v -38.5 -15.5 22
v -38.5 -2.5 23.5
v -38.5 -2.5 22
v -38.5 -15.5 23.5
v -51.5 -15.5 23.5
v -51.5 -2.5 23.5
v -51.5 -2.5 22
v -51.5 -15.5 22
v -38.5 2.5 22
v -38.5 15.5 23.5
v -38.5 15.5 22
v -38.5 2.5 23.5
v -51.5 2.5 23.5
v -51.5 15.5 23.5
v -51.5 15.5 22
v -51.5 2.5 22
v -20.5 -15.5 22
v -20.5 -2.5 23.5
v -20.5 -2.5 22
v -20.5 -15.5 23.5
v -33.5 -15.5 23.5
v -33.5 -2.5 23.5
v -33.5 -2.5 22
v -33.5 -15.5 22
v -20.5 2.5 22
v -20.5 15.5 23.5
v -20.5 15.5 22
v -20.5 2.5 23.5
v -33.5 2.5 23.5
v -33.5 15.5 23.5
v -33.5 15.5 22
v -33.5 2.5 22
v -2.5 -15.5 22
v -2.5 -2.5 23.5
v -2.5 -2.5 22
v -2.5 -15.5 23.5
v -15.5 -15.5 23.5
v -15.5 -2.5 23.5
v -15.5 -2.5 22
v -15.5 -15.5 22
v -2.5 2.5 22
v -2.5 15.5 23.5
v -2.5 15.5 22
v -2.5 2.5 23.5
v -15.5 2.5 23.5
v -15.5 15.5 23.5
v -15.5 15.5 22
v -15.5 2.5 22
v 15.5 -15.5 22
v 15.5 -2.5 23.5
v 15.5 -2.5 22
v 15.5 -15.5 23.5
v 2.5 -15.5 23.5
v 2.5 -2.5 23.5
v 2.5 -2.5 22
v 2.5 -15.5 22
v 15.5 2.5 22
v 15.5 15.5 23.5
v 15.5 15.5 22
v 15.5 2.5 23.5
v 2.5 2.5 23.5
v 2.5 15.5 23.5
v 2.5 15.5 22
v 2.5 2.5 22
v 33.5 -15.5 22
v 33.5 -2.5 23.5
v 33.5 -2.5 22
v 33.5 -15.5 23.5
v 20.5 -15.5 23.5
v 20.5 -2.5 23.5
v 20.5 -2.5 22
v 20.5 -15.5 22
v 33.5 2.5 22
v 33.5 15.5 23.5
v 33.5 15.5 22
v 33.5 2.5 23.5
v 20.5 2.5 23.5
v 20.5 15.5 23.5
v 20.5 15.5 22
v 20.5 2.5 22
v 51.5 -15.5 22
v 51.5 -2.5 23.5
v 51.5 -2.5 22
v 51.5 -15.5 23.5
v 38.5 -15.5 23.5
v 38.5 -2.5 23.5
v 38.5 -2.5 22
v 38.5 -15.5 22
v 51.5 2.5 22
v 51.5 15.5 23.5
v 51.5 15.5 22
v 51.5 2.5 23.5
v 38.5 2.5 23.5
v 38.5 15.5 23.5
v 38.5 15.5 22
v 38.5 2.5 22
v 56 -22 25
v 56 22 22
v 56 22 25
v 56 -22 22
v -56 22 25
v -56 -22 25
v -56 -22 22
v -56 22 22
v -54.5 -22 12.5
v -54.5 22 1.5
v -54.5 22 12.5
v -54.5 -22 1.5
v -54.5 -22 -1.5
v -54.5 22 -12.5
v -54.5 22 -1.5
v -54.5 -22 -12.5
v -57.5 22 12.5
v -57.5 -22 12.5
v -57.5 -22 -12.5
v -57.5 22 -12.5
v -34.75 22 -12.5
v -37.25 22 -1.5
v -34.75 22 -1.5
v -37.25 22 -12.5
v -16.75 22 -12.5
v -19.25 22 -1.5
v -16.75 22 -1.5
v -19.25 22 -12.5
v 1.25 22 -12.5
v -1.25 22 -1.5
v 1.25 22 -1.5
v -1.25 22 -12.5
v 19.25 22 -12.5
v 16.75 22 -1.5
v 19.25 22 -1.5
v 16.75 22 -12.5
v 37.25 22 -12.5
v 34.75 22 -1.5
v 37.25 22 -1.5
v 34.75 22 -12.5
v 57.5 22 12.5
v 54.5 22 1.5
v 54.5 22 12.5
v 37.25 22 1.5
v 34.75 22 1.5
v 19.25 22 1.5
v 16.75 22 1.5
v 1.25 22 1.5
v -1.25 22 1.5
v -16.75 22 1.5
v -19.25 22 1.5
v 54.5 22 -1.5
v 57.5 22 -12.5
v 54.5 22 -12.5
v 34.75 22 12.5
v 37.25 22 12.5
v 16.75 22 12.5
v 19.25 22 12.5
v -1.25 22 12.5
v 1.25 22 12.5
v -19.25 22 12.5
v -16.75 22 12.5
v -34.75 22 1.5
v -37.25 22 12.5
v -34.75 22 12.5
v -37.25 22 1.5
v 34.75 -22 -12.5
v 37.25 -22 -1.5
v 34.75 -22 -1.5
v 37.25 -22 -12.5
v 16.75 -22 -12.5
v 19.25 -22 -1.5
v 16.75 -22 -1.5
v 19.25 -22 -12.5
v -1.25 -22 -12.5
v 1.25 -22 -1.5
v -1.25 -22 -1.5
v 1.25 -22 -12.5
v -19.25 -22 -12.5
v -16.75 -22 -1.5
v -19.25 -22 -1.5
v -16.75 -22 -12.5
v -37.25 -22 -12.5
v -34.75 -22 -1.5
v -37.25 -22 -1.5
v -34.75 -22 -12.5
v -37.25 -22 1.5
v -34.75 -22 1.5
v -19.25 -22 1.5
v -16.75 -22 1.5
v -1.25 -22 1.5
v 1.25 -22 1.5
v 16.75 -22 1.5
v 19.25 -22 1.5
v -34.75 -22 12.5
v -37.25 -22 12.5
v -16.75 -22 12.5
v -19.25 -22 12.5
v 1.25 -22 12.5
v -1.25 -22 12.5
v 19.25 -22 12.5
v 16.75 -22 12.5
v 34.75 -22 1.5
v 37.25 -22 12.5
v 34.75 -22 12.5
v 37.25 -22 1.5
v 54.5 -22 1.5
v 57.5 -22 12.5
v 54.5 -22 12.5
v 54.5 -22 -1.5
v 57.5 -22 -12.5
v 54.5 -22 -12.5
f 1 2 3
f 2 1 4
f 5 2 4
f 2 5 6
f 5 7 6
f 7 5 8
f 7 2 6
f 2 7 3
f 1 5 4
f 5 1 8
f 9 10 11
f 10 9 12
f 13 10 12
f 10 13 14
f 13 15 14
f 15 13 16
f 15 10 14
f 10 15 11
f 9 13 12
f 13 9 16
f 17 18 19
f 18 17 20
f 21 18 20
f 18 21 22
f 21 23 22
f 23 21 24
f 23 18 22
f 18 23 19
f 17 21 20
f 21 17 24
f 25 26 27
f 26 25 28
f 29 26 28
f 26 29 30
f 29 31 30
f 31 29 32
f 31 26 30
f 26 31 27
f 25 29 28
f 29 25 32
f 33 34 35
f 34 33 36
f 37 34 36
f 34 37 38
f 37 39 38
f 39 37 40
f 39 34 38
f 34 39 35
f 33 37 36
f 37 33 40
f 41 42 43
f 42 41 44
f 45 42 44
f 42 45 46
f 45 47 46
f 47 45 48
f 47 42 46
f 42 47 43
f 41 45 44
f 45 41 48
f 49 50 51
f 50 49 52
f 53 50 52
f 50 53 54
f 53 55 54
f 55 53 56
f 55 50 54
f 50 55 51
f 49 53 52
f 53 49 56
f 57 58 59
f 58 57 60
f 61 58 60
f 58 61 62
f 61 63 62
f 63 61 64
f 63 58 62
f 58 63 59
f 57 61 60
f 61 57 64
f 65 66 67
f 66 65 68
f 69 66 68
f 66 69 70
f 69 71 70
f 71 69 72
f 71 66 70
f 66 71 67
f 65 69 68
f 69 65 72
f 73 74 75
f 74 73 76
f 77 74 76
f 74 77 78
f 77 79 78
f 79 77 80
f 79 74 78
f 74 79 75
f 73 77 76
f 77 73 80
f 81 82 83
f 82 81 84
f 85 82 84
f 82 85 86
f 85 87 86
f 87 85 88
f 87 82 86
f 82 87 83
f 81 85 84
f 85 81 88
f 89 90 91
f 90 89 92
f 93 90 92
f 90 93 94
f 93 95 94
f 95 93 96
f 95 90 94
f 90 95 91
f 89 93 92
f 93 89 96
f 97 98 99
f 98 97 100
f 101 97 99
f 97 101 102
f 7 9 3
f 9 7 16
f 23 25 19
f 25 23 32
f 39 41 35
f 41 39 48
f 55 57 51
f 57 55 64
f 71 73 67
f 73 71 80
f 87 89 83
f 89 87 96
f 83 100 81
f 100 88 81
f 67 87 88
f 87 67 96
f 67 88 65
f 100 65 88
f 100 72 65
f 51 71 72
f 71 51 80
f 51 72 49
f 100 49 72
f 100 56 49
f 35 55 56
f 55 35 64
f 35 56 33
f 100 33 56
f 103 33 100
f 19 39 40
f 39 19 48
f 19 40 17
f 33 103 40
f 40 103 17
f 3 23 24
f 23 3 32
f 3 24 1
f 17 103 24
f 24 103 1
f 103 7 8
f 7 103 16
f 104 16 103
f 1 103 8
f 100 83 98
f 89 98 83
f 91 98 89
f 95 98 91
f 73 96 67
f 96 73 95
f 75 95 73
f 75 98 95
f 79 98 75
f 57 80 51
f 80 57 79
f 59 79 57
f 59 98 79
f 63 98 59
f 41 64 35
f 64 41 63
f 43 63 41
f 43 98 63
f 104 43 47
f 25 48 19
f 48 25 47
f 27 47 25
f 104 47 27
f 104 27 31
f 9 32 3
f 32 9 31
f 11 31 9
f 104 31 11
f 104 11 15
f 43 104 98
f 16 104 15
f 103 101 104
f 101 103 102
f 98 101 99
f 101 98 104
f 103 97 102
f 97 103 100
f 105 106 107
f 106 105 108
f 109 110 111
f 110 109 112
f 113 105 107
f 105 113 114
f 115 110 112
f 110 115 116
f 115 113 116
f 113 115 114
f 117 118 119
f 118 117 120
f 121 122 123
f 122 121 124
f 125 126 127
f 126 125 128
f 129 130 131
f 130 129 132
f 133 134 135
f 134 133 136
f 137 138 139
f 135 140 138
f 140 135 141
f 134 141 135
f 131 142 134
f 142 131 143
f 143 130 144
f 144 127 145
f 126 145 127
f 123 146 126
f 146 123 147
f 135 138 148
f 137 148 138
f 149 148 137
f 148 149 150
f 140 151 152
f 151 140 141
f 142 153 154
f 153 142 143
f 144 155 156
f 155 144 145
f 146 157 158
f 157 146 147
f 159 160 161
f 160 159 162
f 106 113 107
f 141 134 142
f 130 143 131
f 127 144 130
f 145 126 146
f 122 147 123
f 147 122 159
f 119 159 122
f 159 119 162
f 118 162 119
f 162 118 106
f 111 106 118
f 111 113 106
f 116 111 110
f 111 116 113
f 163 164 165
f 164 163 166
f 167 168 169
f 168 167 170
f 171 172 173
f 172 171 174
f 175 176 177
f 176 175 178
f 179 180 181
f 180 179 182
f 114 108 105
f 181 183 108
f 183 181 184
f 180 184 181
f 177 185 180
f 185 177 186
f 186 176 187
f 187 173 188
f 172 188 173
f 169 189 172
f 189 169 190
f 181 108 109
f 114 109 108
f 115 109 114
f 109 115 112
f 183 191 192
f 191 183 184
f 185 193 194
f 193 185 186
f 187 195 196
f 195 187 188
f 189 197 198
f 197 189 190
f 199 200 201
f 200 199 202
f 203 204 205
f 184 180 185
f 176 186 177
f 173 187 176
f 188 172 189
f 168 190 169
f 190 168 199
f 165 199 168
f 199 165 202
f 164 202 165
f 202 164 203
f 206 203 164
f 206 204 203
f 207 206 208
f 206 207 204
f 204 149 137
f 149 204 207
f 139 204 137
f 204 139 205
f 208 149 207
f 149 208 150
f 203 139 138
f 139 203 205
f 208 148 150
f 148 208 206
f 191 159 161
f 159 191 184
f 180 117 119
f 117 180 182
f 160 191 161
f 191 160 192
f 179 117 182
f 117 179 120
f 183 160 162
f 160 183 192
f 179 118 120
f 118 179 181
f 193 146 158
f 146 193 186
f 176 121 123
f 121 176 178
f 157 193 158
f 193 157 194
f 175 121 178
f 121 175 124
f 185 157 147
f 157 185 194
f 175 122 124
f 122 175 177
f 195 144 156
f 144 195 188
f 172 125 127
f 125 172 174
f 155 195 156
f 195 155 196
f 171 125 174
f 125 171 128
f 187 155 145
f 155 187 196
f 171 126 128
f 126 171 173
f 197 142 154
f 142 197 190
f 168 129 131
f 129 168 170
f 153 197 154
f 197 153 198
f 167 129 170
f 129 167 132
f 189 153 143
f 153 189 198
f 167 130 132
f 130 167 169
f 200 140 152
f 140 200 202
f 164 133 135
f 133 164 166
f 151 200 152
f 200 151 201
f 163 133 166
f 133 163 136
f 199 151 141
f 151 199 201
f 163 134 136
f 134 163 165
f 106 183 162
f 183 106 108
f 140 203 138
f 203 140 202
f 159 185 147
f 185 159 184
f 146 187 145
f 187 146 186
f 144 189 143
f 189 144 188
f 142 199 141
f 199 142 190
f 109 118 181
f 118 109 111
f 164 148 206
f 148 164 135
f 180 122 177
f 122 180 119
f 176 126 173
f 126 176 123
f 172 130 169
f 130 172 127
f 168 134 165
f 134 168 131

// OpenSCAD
// 12-cuvette rack, printed standing on its base (z = 0 to 25)
// All dimensions in mm, measured with calipers.

// Base / deck plates
base_x = 112;   // base plate length along X
base_y = 44;    // base plate depth along Y
base_t = 3;     // base plate thickness (z 0..3)
deck_t = 3;     // deck plate thickness (z 22..25)
deck_z = 22;    // bottom of deck plate

// Upright walls (full height, as deep as the plates)
wall_h = 25;    // total height of walls (z 0..25)
end_w = 3;      // thickness of the two end walls (along X)
rib_w = 2.5;    // thickness of the five internal ribs (along X)
rib_x = [-36, -18, 0, 18, 36];  // centre X positions of the five ribs

// Deck through-holes for 12.5 mm square cuvettes
hole_s = 13;    // square hole side length
pitch = 18;     // centre-to-centre spacing in both X and Y
n_rows = 2;     // rows along Y
n_cols = 6;     // columns along X

$fn = 64;

// ---- Base plate (z 0..3), centred on origin ----
module base() {
    translate([0, 0, 0])
        cube([base_x, base_y, base_t], center = true);
}

// ---- Deck plate (z 22..25), centred on origin ----
module deck() {
    translate([0, 0, deck_z + deck_t / 2])
        cube([base_x, base_y, deck_t], center = true);
}

// ---- 12 square through-holes in the deck ----
// 2 rows (Y) x 6 columns (X), 18 mm pitch, centred on the deck.
module hole_cutters() {
    for (i = [0 : n_cols - 1], j = [0 : n_rows - 1])
        translate([
            (i - (n_cols - 1) / 2) * pitch,   // X
            (j - (n_rows - 1) / 2) * pitch,   // Y
            deck_z - 1                        // extend 1 mm below deck bottom
        ])
        cube([hole_s, hole_s, deck_t + 2], center = true);
}

// ---- Seven upright walls, z 0..25, full Y depth ----
// Two 3 mm end walls flush with the short ends (x = ±56)
module end_walls() {
    translate([-base_x / 2, 0, 0])
        cube([end_w, base_y, wall_h], center = true);
    translate([ base_x / 2, 0, 0])
        cube([end_w, base_y, wall_h], center = true);
}

// Five 2.5 mm ribs centred at x = -36, -18, 0, 18, 36
module ribs() {
    for (x = rib_x)
        translate([x, 0, 0])
            cube([rib_w, base_y, wall_h], center = true);
}

// ---- Assemble ----
union() {
    base();
    difference() {
        deck();
        hole_cutters();
    }
    end_walls();
    ribs();
}
